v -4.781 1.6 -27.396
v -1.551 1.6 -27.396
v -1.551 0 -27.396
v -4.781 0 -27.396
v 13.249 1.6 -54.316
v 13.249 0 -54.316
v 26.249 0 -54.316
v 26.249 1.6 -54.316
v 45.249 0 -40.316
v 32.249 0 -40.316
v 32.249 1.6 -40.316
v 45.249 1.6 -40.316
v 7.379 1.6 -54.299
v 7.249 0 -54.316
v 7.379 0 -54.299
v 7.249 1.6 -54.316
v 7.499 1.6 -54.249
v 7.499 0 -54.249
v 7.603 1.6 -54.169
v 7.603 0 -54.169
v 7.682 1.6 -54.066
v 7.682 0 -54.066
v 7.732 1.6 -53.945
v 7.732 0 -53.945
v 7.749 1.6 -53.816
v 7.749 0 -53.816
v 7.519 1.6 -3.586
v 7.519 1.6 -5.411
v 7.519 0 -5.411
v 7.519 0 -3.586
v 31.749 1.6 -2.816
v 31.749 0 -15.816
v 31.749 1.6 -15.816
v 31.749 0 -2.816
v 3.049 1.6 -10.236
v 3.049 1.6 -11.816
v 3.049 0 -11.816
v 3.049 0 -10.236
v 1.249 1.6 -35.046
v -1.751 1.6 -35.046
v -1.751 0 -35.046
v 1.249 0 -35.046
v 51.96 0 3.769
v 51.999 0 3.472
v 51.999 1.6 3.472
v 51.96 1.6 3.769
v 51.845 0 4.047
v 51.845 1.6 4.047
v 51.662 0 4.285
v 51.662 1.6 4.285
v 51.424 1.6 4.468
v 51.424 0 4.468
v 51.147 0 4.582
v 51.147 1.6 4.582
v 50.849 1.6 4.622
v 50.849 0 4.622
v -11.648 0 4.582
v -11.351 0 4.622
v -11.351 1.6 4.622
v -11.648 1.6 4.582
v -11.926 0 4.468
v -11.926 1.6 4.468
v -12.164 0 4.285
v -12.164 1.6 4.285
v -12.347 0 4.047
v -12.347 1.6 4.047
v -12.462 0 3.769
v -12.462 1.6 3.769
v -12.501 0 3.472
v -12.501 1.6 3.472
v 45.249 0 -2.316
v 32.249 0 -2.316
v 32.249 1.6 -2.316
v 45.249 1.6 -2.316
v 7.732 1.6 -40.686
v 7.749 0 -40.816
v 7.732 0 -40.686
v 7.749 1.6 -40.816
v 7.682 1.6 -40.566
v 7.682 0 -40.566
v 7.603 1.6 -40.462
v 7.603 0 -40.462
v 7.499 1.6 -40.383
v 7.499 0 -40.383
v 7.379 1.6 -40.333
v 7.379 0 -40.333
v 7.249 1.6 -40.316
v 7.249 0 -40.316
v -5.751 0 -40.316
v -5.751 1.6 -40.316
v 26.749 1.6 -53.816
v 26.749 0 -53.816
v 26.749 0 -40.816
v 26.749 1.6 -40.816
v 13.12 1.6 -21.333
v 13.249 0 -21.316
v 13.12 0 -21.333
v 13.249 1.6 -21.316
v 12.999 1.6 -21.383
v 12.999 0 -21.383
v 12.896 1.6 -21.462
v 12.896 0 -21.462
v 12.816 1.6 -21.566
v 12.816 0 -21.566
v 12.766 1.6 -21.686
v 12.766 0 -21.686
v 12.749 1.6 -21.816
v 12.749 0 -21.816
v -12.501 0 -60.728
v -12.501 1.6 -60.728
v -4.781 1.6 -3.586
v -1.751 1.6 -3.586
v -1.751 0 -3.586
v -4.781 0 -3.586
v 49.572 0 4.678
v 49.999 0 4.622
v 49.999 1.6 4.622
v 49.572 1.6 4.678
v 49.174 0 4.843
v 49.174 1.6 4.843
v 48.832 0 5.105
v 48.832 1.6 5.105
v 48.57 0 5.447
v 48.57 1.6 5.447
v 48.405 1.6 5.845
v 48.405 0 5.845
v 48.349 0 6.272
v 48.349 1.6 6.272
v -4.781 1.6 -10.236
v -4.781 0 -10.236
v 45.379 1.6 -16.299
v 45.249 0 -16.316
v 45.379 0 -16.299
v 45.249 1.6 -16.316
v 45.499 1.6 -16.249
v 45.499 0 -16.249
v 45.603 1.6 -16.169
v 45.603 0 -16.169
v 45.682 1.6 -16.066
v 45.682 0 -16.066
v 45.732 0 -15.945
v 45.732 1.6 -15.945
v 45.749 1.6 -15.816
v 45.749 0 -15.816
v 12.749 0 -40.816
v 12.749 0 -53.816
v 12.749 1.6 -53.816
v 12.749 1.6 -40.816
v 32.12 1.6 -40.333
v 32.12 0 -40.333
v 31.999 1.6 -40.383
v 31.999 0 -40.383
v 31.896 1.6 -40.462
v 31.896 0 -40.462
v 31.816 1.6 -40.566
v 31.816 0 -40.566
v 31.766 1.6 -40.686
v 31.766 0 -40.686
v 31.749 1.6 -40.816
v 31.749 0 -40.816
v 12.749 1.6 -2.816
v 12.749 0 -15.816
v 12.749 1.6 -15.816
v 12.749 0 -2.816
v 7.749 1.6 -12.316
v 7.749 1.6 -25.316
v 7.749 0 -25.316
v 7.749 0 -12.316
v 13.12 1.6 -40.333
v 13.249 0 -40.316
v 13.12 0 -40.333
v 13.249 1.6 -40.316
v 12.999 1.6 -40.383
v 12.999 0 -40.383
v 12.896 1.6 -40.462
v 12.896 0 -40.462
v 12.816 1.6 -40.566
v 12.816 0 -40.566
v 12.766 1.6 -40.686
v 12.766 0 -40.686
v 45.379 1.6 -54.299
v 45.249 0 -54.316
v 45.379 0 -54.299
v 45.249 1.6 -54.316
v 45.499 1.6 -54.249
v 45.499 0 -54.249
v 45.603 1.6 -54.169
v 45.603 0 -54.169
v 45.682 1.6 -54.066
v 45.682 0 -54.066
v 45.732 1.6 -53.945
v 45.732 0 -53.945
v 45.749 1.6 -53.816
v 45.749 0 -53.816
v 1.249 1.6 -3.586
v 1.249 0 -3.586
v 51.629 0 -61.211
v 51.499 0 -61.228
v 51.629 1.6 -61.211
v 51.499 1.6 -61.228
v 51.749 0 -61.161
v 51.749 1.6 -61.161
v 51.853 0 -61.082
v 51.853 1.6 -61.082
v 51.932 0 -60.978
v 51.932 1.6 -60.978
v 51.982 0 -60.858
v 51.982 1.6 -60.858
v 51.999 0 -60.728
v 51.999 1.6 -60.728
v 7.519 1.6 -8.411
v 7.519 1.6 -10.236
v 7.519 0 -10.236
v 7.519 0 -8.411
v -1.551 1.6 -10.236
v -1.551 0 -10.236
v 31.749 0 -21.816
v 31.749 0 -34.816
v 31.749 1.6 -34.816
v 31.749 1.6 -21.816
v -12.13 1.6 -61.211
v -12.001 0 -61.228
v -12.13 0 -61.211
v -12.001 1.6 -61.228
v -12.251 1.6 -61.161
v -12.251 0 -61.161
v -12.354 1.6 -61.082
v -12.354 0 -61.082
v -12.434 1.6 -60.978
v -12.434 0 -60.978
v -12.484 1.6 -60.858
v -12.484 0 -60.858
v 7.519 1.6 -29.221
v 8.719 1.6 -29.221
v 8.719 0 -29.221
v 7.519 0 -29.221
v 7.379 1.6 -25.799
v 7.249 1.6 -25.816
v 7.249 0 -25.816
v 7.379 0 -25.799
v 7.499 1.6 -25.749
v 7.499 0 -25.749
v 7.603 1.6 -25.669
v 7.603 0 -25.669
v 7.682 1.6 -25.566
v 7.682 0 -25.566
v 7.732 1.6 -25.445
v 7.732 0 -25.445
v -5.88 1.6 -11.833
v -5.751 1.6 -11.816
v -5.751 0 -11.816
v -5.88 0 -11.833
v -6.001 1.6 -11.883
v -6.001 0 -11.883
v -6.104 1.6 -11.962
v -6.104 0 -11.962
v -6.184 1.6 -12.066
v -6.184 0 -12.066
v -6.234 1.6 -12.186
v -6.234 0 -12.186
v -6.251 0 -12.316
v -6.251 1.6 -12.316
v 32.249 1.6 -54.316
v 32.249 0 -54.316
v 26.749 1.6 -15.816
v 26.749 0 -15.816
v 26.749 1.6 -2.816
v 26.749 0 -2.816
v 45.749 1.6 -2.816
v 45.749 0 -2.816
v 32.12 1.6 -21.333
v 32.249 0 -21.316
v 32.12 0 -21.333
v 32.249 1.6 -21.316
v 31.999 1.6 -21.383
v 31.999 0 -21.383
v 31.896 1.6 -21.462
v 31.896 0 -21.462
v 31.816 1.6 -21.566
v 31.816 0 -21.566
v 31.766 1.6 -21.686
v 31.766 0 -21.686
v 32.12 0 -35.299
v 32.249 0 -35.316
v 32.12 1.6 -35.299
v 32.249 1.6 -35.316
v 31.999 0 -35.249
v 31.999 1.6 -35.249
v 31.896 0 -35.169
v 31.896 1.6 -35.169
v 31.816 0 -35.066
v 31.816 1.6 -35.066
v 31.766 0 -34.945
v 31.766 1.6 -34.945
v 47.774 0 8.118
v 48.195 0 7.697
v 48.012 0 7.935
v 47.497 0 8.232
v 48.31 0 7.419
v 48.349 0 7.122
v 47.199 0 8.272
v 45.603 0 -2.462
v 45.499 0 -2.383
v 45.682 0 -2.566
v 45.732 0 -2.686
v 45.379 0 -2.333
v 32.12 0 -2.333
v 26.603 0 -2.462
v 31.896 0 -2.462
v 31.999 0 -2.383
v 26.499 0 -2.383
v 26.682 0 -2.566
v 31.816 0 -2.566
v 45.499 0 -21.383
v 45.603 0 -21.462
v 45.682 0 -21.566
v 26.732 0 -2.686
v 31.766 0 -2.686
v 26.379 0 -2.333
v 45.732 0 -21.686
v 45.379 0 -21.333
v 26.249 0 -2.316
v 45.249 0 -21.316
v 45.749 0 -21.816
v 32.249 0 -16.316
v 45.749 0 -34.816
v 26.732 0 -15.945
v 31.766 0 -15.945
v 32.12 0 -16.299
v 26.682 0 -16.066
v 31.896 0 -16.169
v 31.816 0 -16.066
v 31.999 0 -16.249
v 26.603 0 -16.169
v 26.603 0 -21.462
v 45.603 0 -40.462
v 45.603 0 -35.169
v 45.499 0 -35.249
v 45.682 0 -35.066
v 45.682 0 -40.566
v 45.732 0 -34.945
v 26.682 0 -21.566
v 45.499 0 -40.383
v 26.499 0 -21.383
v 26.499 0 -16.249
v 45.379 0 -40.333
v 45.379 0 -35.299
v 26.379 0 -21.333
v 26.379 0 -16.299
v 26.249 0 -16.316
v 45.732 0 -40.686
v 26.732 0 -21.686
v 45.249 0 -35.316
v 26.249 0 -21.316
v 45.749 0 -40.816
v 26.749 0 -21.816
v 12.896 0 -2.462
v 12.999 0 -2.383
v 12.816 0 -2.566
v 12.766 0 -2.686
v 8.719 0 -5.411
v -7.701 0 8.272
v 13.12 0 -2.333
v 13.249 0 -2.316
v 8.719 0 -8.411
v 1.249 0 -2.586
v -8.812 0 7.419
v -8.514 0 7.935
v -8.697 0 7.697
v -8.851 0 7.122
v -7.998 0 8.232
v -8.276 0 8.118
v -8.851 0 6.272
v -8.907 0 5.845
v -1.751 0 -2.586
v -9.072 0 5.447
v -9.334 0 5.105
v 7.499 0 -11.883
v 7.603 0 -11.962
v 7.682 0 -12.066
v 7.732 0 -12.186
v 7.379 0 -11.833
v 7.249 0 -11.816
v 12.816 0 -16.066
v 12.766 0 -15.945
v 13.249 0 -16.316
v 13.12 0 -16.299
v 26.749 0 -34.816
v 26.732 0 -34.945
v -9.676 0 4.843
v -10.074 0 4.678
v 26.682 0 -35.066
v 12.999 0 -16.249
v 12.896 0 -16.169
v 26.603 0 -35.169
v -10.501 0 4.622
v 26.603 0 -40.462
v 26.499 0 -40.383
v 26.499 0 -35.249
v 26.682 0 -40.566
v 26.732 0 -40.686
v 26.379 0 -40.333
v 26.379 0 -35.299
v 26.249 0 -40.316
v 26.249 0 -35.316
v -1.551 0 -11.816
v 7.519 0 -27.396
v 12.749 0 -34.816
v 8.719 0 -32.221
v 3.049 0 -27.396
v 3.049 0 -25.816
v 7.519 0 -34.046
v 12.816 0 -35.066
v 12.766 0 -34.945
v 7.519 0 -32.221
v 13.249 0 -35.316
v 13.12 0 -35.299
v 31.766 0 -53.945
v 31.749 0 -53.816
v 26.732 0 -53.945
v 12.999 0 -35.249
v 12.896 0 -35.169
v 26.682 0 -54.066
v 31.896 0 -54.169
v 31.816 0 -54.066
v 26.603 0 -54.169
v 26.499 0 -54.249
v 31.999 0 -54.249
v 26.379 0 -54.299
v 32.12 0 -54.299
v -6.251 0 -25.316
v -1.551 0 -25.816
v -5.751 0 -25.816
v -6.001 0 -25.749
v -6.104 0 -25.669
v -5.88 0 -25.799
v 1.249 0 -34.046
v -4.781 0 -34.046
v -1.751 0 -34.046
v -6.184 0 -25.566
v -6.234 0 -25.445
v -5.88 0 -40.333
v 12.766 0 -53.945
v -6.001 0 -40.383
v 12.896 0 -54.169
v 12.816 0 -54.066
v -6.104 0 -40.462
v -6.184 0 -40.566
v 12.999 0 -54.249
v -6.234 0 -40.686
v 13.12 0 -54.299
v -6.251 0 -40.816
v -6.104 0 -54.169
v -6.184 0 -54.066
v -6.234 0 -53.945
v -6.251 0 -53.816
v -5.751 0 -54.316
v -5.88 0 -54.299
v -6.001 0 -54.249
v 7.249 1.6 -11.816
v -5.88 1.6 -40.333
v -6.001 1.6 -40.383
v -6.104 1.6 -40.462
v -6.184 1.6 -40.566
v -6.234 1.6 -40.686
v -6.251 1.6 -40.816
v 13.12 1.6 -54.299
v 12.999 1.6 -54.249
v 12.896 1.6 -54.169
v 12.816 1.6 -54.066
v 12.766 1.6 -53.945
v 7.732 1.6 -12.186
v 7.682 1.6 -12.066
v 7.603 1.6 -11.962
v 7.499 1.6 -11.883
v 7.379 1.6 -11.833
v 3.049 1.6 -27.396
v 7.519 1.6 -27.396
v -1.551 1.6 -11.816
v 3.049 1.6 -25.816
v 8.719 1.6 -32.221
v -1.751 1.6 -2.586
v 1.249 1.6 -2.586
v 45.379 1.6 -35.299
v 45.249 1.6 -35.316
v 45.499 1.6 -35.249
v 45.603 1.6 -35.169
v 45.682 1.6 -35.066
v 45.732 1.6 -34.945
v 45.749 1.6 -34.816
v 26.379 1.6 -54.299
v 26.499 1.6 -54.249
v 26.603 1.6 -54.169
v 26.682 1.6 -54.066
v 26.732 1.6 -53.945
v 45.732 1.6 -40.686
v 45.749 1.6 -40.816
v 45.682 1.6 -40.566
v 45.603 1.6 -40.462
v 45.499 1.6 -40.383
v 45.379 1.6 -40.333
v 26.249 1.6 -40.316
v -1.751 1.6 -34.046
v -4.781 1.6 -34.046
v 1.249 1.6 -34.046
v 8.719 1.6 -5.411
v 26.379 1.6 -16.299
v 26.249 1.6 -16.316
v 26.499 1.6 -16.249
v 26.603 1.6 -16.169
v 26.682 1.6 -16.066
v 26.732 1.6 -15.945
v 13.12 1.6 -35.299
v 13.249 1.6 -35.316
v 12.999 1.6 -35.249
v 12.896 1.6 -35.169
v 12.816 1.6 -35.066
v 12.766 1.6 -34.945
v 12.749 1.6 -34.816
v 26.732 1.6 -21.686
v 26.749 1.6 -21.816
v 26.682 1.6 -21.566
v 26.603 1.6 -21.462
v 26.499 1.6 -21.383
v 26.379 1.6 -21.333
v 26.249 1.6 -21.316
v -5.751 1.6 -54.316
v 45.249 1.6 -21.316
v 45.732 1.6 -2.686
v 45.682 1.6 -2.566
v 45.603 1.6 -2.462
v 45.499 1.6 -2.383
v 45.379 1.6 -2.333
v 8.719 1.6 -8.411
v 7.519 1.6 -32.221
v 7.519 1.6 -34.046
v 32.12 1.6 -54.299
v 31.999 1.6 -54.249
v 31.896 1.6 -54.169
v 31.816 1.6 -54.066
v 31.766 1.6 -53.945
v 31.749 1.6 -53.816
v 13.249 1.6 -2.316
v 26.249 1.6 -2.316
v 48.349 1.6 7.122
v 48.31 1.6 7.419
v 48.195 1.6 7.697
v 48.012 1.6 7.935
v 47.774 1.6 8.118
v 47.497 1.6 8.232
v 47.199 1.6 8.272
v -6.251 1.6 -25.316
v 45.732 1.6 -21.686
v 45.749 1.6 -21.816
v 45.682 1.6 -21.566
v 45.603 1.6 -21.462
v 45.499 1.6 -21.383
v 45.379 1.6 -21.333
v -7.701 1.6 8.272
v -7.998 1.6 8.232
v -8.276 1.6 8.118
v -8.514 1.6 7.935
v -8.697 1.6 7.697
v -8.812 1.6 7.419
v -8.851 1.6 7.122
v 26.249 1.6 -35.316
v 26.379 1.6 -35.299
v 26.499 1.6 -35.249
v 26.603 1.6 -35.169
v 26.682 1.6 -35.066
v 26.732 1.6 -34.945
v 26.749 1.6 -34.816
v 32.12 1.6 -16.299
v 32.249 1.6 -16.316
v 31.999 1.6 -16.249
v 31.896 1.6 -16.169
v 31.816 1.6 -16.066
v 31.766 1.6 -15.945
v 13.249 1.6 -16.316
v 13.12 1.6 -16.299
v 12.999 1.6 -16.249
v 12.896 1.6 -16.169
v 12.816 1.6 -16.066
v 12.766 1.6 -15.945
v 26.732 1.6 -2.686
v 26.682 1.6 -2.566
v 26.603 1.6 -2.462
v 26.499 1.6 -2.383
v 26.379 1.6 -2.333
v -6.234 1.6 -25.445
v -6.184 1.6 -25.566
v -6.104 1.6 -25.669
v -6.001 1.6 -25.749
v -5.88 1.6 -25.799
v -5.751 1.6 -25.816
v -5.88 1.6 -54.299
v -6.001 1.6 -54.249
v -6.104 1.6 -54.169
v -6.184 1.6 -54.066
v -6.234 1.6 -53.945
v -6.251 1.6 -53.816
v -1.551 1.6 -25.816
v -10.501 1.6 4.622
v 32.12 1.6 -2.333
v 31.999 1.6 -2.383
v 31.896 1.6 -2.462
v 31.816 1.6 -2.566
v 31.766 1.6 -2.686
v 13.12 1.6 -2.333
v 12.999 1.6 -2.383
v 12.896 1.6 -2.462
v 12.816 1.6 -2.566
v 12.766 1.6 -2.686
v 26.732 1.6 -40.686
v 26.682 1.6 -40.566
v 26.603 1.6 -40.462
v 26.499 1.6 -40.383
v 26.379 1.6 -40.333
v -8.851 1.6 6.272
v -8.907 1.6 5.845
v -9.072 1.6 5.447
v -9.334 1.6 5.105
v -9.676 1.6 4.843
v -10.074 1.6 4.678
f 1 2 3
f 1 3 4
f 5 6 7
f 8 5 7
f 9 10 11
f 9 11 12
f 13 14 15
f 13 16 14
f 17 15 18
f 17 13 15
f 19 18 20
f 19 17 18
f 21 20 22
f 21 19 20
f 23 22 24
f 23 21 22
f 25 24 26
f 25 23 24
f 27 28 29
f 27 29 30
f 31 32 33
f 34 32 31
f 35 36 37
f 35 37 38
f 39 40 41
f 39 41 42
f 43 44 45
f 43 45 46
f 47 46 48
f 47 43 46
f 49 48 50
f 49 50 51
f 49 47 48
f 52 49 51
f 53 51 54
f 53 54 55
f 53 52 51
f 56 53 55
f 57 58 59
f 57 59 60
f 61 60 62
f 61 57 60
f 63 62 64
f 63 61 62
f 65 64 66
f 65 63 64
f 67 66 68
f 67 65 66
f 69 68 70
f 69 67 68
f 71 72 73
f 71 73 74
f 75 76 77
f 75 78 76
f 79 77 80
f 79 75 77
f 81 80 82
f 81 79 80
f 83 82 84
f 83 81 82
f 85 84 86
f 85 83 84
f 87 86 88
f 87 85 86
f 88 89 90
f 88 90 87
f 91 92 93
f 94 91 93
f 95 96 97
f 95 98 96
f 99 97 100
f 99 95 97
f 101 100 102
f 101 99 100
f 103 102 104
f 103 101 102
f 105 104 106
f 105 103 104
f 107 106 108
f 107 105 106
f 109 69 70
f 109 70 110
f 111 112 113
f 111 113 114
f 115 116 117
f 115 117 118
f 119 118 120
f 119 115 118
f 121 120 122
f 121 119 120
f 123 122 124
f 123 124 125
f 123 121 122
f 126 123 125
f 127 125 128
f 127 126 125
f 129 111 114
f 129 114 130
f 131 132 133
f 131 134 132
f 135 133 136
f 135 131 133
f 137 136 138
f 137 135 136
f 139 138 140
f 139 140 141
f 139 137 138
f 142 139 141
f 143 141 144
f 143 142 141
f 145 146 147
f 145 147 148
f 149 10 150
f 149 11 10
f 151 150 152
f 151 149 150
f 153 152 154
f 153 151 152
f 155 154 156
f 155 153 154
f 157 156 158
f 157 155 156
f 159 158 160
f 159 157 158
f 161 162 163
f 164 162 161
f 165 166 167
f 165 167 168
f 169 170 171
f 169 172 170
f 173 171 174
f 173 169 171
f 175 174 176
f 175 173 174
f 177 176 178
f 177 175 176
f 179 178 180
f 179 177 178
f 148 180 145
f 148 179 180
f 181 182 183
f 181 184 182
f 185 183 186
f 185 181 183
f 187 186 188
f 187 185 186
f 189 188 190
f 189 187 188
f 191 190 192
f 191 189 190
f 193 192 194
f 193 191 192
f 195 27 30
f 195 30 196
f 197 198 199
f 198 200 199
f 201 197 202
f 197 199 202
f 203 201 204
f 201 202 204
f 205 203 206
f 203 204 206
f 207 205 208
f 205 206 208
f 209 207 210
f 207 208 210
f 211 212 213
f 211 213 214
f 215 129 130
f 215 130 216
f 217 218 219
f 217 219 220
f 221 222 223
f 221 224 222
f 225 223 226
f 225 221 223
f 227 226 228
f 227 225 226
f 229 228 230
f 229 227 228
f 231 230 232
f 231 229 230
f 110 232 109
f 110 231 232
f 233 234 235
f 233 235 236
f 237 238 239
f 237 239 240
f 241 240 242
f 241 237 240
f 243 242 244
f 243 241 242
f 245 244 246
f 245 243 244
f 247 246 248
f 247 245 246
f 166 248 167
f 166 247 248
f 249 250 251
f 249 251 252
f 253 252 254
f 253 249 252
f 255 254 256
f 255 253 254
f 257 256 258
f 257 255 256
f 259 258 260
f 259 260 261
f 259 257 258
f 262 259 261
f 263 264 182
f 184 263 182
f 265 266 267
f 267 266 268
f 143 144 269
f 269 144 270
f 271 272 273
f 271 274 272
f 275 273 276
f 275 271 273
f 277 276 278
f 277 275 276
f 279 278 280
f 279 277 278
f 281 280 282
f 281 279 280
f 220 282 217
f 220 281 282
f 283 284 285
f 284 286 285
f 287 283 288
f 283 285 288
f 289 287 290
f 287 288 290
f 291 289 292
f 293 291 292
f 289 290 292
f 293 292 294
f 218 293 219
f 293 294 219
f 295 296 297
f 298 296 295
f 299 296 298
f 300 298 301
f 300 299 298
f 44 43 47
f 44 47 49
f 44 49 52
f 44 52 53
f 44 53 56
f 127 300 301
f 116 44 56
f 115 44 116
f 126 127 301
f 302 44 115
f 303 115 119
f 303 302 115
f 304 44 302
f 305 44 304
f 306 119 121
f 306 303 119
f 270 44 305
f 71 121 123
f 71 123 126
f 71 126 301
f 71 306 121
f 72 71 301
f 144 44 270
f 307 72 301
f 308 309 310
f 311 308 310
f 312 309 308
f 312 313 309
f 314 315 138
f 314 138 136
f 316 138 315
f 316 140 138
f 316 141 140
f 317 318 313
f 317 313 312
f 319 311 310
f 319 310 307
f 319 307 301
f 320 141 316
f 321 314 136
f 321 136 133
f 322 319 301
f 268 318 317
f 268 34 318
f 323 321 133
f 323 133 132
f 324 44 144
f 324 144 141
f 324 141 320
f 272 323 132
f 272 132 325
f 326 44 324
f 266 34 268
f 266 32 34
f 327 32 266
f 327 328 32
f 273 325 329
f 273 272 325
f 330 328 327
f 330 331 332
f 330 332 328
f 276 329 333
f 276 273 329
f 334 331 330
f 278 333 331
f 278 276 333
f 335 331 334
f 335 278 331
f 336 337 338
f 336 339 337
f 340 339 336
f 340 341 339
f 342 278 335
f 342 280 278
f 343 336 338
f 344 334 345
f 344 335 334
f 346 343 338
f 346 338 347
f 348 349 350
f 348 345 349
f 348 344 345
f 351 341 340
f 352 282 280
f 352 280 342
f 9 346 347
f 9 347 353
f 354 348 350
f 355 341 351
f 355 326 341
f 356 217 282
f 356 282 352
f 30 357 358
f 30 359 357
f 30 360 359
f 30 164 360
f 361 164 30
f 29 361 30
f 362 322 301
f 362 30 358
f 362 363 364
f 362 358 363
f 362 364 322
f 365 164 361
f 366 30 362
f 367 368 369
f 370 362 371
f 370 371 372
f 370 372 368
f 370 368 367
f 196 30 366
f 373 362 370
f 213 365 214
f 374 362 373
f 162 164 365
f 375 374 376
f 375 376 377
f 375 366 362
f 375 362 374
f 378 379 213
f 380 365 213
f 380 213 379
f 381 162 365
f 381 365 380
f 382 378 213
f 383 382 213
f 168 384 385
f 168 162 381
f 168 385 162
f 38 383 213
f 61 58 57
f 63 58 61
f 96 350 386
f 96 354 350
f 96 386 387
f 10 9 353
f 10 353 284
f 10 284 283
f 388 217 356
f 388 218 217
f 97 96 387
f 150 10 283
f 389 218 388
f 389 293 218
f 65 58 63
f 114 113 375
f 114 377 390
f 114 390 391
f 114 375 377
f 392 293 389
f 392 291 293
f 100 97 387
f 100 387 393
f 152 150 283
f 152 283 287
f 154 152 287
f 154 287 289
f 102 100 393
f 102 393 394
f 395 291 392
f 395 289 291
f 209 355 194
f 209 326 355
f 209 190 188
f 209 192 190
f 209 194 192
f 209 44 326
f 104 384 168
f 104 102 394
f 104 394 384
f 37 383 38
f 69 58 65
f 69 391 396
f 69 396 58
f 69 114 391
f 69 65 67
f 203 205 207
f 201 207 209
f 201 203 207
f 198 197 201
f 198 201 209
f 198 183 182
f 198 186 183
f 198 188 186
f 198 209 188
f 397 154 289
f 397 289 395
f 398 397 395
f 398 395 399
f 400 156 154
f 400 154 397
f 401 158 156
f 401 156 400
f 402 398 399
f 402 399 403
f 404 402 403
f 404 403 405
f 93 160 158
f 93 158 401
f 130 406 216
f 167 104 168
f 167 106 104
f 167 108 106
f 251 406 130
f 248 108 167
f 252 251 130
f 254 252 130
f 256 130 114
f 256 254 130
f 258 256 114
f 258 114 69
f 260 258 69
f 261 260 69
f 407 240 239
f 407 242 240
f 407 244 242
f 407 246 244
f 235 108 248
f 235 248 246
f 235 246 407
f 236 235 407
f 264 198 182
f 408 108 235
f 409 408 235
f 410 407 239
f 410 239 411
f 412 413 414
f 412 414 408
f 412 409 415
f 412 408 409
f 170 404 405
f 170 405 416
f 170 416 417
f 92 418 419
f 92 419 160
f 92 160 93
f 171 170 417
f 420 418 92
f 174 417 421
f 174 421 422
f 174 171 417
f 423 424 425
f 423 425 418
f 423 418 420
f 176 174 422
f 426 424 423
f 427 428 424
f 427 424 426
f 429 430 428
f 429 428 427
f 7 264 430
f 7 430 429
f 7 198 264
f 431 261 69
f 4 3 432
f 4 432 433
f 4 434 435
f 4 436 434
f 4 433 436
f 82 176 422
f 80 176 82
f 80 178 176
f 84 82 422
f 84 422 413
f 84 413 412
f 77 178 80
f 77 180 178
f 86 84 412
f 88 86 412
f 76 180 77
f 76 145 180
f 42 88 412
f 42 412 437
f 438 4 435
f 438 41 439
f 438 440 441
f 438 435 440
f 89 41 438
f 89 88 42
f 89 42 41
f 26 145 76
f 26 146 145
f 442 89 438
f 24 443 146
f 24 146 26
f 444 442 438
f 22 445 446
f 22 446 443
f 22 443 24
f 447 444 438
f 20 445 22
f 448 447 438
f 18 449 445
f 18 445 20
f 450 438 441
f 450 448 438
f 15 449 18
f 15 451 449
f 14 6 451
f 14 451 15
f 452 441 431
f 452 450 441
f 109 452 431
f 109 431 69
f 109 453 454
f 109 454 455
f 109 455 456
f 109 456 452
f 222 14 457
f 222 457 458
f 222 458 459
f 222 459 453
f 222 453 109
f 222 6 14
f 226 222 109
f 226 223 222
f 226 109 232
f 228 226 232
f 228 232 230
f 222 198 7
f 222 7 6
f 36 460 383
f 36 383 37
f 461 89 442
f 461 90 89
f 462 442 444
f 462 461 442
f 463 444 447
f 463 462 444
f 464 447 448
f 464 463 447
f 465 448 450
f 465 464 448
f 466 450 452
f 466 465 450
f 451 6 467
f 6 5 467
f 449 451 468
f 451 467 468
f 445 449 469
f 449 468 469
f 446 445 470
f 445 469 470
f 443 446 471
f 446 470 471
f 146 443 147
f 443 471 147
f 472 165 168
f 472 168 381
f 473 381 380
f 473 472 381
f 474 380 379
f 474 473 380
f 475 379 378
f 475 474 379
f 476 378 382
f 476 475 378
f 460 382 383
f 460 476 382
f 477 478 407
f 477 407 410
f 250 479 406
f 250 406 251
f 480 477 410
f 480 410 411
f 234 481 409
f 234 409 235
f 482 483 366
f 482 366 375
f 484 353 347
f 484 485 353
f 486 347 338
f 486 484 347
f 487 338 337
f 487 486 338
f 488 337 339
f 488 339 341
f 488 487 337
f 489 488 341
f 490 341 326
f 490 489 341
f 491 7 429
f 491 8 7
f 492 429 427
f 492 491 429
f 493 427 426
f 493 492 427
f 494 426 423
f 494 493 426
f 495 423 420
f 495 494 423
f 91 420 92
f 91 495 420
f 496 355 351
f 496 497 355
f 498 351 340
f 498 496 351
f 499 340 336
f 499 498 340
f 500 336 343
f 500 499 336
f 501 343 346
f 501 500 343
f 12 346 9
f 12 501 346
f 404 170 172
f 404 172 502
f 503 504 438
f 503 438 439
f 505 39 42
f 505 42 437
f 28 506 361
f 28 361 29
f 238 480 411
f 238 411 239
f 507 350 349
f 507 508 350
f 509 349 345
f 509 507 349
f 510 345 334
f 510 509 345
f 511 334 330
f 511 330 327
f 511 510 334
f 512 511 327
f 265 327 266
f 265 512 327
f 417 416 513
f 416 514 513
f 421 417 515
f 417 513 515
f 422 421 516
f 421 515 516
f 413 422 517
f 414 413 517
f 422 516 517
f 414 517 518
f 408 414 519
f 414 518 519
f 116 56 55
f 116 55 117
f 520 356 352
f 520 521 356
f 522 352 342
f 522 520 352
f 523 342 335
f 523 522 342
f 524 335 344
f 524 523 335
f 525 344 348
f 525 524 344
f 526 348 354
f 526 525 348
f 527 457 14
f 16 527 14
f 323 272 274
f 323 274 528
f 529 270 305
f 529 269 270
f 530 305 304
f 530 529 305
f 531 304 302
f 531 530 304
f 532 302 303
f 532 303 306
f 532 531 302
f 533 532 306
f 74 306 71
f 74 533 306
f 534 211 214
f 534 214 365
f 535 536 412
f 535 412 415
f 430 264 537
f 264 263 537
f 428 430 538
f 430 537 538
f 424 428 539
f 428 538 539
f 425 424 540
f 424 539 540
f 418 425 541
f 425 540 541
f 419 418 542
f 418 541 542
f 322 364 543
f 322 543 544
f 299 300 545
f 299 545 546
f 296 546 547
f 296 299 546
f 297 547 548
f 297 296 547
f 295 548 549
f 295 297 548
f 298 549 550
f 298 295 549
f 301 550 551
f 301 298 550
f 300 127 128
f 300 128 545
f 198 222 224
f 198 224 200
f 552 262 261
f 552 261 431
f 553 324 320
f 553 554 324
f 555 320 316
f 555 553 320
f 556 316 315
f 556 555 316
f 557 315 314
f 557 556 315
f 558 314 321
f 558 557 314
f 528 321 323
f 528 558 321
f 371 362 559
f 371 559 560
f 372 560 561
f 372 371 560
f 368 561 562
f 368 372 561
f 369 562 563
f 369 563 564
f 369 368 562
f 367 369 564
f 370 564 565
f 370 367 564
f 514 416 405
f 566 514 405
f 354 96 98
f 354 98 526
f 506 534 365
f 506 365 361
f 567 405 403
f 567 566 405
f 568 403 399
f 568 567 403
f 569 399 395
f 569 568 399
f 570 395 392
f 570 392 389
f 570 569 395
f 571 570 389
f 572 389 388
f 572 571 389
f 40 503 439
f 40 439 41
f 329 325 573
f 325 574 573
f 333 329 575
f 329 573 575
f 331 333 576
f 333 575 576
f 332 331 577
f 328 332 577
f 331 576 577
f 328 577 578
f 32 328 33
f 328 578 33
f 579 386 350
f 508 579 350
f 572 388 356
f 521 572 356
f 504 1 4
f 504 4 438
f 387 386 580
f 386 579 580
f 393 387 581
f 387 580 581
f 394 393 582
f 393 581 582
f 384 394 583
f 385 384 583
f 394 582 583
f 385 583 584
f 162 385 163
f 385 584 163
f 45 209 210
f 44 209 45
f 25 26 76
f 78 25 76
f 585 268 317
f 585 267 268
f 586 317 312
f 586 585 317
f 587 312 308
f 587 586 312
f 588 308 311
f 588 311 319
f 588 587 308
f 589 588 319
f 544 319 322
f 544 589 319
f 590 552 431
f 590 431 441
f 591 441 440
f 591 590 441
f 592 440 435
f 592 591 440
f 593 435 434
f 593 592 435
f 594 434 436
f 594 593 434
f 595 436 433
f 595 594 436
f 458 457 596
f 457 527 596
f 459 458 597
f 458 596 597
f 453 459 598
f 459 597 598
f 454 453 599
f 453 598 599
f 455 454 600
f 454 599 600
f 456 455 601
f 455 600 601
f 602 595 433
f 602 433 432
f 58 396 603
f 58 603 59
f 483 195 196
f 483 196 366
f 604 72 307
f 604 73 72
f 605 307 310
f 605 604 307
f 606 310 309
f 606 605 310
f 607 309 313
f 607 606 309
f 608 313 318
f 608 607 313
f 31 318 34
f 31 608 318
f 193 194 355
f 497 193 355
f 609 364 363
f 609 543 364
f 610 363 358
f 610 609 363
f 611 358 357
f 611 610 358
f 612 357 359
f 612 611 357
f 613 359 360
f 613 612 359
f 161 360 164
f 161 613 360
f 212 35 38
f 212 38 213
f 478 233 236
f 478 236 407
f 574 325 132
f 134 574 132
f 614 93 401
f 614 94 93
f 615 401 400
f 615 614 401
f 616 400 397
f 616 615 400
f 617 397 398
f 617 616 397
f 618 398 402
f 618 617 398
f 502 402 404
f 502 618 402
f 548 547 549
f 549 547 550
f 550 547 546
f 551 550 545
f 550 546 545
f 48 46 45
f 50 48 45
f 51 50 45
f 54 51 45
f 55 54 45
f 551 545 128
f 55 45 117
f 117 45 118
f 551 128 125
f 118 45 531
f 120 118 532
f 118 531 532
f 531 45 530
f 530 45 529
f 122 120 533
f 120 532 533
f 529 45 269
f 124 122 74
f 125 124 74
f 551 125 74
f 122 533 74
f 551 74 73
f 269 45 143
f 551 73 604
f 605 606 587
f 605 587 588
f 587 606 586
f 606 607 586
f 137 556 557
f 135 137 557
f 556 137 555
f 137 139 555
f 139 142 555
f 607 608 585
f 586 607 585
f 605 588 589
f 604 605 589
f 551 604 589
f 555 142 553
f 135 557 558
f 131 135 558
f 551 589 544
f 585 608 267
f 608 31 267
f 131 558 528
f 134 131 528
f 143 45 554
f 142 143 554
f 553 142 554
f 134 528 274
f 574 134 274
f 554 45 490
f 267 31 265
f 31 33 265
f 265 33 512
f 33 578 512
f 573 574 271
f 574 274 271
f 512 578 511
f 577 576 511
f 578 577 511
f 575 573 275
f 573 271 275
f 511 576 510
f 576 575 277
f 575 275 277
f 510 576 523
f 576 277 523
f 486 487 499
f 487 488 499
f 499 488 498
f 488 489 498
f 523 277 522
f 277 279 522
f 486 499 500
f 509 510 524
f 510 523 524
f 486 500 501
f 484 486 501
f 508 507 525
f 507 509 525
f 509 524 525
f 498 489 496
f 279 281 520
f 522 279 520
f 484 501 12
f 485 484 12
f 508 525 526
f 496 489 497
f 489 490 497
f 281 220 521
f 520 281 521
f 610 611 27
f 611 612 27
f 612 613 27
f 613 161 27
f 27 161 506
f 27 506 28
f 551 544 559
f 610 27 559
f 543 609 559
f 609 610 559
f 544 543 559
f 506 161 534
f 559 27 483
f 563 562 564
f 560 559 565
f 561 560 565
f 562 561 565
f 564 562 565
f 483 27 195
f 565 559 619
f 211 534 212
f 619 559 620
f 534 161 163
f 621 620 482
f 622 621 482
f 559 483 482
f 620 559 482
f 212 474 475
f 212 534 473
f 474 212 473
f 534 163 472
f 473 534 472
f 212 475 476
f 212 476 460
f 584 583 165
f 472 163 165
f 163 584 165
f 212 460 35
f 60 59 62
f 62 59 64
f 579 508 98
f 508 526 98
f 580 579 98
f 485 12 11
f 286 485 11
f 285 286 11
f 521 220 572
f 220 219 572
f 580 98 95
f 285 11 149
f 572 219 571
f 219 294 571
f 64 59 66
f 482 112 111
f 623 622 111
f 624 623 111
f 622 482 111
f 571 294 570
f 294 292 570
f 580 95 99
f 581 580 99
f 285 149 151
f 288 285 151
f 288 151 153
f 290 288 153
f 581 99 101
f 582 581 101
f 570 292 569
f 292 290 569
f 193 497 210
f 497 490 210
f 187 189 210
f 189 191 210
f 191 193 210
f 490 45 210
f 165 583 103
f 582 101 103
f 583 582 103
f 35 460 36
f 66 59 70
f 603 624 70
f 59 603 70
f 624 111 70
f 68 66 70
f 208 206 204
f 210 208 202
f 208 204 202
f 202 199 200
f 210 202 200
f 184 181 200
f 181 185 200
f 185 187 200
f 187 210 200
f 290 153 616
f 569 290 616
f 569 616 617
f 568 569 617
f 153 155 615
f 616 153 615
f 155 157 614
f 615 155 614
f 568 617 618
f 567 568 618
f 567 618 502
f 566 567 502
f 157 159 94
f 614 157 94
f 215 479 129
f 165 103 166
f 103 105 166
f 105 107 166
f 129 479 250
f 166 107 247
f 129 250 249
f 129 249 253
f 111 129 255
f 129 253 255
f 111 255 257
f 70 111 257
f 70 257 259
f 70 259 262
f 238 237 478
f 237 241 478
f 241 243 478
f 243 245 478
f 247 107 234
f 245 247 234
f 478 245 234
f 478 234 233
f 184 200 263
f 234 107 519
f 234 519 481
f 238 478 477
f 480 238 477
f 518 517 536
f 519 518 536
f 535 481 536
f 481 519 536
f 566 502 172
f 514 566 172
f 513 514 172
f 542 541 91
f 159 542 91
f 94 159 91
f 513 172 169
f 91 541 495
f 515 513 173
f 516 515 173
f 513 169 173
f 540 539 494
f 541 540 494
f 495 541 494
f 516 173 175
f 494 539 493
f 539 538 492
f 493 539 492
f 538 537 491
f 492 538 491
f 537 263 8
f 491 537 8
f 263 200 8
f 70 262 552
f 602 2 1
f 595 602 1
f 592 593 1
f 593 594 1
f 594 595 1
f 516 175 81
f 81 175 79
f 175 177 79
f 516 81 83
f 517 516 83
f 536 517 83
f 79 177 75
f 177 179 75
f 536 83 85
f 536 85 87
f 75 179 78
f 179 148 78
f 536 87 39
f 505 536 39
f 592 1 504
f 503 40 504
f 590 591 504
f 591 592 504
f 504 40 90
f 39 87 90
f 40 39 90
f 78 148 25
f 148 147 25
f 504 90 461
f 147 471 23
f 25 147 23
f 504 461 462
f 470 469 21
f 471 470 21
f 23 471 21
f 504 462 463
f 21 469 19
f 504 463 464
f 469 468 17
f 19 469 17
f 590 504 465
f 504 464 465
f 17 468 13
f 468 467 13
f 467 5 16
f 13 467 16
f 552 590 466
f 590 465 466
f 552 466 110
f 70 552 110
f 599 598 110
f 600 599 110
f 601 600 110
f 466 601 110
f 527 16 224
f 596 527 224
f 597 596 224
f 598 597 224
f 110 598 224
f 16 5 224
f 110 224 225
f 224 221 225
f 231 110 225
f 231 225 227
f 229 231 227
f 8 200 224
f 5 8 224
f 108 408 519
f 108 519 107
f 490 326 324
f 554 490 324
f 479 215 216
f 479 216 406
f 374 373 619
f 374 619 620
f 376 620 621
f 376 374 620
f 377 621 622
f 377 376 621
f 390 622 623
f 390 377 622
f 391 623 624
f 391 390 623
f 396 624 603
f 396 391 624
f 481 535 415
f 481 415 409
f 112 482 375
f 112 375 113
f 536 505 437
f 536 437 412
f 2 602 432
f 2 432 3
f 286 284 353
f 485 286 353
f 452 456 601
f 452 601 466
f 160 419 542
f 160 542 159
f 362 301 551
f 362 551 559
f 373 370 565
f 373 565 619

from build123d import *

# Parameters (mm, degrees)
EXTRUDE_1_DEPTH                = 1.6
SKETCH_2_W                     = 14
SKETCH_2_H                     = 14
CUT_EXTRUDE_1_DEPTH            = 1.6
FILLET_1_R                     = 0.5
PATTERN_LINEAR_2_COUNT         = 3
PATTERN_LINEAR_2_PITCH         = 19
PATTERN_LINEAR_2_COUNT_DIR2    = 3
PATTERN_LINEAR_2_PITCH_DIR2    = 19
FILLET_1_OF_PATTERN_LINEAR_2_R = 0.5
CUT_EXTRUDE_3_DEPTH            = 1.6
FILLET_2_R                     = 0.5


with BuildPart() as part:
    # 草图1 → 凸台-拉伸1 (new body)
    with BuildSketch(Plane(origin=(0, 0, 0), x_dir=(1, 0, 0), z_dir=(0, 1, 0))):
        with BuildLine():
            Line((-12.500806884, 61.22832279), (51.999193116, 61.22832279))
            Line((51.999193116, 61.22832279), (51.999193116, -3.47167721))
            ThreePointArc((51.999193116, -3.47167721), (51.662365914, -4.284850009), (50.849193116, -4.62167721))
            Line((50.849193116, -4.62167721), (49.999193116, -4.62167721))
            ThreePointArc((49.999193116, -4.62167721), (48.832466927, -5.104951021), (48.349193116, -6.27167721))
            Line((48.349193116, -6.27167721), (48.349193116, -7.12167721))
            ThreePointArc((48.349193116, -7.12167721), (48.012365914, -7.934850009), (47.199193116, -8.27167721))
            Line((47.199193116, -8.27167721), (-7.700806884, -8.27167721))
            ThreePointArc((-7.700806884, -8.27167721), (-8.513979683, -7.934850009), (-8.850806884, -7.12167721))
            Line((-8.850806884, -7.12167721), (-8.850806884, -6.27167721))
            ThreePointArc((-8.850806884, -6.27167721), (-9.334080695, -5.104951021), (-10.500806884, -4.62167721))
            Line((-10.500806884, -4.62167721), (-11.350806884, -4.62167721))
            ThreePointArc((-11.350806884, -4.62167721), (-12.163979683, -4.284850009), (-12.500806884, -3.47167721))
            Line((-12.500806884, -3.47167721), (-12.500806884, 61.22832279))
        make_face()
    extrude(amount=EXTRUDE_1_DEPTH)

    # 草图2 → 切除-拉伸1 (cut)
    with BuildSketch(Plane.XZ):
        with Locations((38.749193116, -9.315811453)):
            Rectangle(SKETCH_2_W, SKETCH_2_H)
    cut_extrude_1 = extrude(amount=-CUT_EXTRUDE_1_DEPTH, mode=Mode.SUBTRACT)

    # 圆角1
    fillet_1_edges = [part.edges().sort_by_distance(p)[0] for p in [
        (31.749193116, 0.8, -16.315811453),
        (31.749193116, 0.8, -2.315811453),
        (45.749193116, 0.8, -2.315811453),
        (45.749193116, 0.8, -16.315811453),
    ]]
    fillet(fillet_1_edges, radius=FILLET_1_R)

    # 阵列(线性)2: Cut-Extrude 1 3 × 3, 2 skipped
    with Locations(*[(-j * PATTERN_LINEAR_2_PITCH_DIR2, 0, -i * PATTERN_LINEAR_2_PITCH) for i in range(PATTERN_LINEAR_2_COUNT) for j in range(PATTERN_LINEAR_2_COUNT_DIR2) if (i, j) not in ((0, 0), (0, 2), (1, 2))]):
        add(cut_extrude_1, mode=Mode.SUBTRACT)

    # 圆角1 of 阵列(线性)2
    fillet_1_of_pattern_linear_2_edges = [part.edges().sort_by_distance(p)[0] for p in [
        (12.749193116, 0.8, -16.315811453),
        (12.749193116, 0.8, -2.315811453),
        (26.749193116, 0.8, -2.315811453),
        (26.749193116, 0.8, -16.315811453),
        (31.749193116, 0.8, -35.315811453),
        (31.749193116, 0.8, -21.315811453),
        (45.749193116, 0.8, -21.315811453),
        (45.749193116, 0.8, -35.315811453),
        (12.749193116, 0.8, -35.315811453),
        (12.749193116, 0.8, -21.315811453),
        (26.749193116, 0.8, -21.315811453),
        (26.749193116, 0.8, -35.315811453),
        (31.749193116, 0.8, -54.315811453),
        (31.749193116, 0.8, -40.315811453),
        (45.749193116, 0.8, -40.315811453),
        (45.749193116, 0.8, -54.315811453),
        (12.749193116, 0.8, -54.315811453),
        (12.749193116, 0.8, -40.315811453),
        (26.749193116, 0.8, -40.315811453),
        (26.749193116, 0.8, -54.315811453),
        (-6.250806884, 0.8, -54.315811453),
        (-6.250806884, 0.8, -40.315811453),
        (7.749193116, 0.8, -40.315811453),
        (7.749193116, 0.8, -54.315811453),
    ]]
    fillet(fillet_1_of_pattern_linear_2_edges, radius=FILLET_1_OF_PATTERN_LINEAR_2_R)

    # 草图3 → 切除-拉伸3 (cut)
    with BuildSketch(Plane(origin=(0, 1.6, 0), x_dir=(1, 0, 0), z_dir=(0, 1, 0))):
        with BuildLine():
            Line((-6.250806884, 12.315811453), (-6.250806884, 25.315811453))
            ThreePointArc((-6.250806884, 25.315811453), (-6.104360275, 25.669364844), (-5.750806884, 25.815811453))
            Line((-5.750806884, 25.815811453), (-1.550806884, 25.815811453))
            Line((-1.550806884, 25.815811453), (-1.550806884, 27.395811453))
            Line((-1.550806884, 27.395811453), (-4.780806884, 27.395811453))
            Line((-4.780806884, 27.395811453), (-4.780806884, 34.045811453))
            Line((-4.780806884, 34.045811453), (-1.750806884, 34.045811453))
            Line((-1.750806884, 34.045811453), (-1.750806884, 35.045811453))
            Line((-1.750806884, 35.045811453), (1.249193116, 35.045811453))
            Line((1.249193116, 35.045811453), (1.249193116, 34.045811453))
            Line((1.249193116, 34.045811453), (7.519193116, 34.045811453))
            Line((7.519193116, 34.045811453), (7.519193116, 32.220811453))
            Line((7.519193116, 32.220811453), (8.719193116, 32.220811453))
            Line((8.719193116, 32.220811453), (8.719193116, 29.220811453))
            Line((8.719193116, 29.220811453), (7.519193116, 29.220811453))
            Line((7.519193116, 29.220811453), (7.519193116, 27.395811453))
            Line((7.519193116, 27.395811453), (3.049193116, 27.395811453))
            Line((3.049193116, 27.395811453), (3.049193116, 25.815811453))
            Line((3.049193116, 25.815811453), (7.249193116, 25.815811453))
            ThreePointArc((7.249193116, 25.815811453), (7.602746506, 25.669364844), (7.749193116, 25.315811453))
            Line((7.749193116, 25.315811453), (7.749193116, 12.315811453))
            ThreePointArc((7.749193116, 12.315811453), (7.602746506, 11.962258063), (7.249193116, 11.815811453))
            Line((7.249193116, 11.815811453), (3.049193116, 11.815811453))
            Line((3.049193116, 11.815811453), (3.049193116, 10.235811453))
            Line((3.049193116, 10.235811453), (7.519193116, 10.235811453))
            Line((7.519193116, 10.235811453), (7.519193116, 8.410811453))
            Line((7.519193116, 8.410811453), (8.719193116, 8.410811453))
            Line((8.719193116, 8.410811453), (8.719193116, 5.410811453))
            Line((8.719193116, 5.410811453), (7.519193116, 5.410811453))
            Line((7.519193116, 5.410811453), (7.519193116, 3.585811453))
            Line((7.519193116, 3.585811453), (1.249193116, 3.585811453))
            Line((1.249193116, 3.585811453), (1.249193116, 2.585811453))
            Line((1.249193116, 2.585811453), (-1.750806884, 2.585811453))
            Line((-1.750806884, 2.585811453), (-1.750806884, 3.585811453))
            Line((-1.750806884, 3.585811453), (-4.780806884, 3.585811453))
            Line((-4.780806884, 3.585811453), (-4.780806884, 10.235811453))
            Line((-4.780806884, 10.235811453), (-1.550806884, 10.235811453))
            Line((-1.550806884, 10.235811453), (-1.550806884, 11.815811453))
            Line((-1.550806884, 11.815811453), (-5.750806884, 11.815811453))
            ThreePointArc((-5.750806884, 11.815811453), (-6.104360275, 11.962258063), (-6.250806884, 12.315811453))
        make_face()
    extrude(amount=-CUT_EXTRUDE_3_DEPTH, mode=Mode.SUBTRACT)

    # 圆角2
    fillet_2_edges = [part.edges().sort_by_distance(p)[0] for p in [
        (-12.500806884, 0.8, -61.22832279),
        (51.999193116, 0.8, -61.22832279),
    ]]
    fillet(fillet_2_edges, radius=FILLET_2_R)


solid = part.part
